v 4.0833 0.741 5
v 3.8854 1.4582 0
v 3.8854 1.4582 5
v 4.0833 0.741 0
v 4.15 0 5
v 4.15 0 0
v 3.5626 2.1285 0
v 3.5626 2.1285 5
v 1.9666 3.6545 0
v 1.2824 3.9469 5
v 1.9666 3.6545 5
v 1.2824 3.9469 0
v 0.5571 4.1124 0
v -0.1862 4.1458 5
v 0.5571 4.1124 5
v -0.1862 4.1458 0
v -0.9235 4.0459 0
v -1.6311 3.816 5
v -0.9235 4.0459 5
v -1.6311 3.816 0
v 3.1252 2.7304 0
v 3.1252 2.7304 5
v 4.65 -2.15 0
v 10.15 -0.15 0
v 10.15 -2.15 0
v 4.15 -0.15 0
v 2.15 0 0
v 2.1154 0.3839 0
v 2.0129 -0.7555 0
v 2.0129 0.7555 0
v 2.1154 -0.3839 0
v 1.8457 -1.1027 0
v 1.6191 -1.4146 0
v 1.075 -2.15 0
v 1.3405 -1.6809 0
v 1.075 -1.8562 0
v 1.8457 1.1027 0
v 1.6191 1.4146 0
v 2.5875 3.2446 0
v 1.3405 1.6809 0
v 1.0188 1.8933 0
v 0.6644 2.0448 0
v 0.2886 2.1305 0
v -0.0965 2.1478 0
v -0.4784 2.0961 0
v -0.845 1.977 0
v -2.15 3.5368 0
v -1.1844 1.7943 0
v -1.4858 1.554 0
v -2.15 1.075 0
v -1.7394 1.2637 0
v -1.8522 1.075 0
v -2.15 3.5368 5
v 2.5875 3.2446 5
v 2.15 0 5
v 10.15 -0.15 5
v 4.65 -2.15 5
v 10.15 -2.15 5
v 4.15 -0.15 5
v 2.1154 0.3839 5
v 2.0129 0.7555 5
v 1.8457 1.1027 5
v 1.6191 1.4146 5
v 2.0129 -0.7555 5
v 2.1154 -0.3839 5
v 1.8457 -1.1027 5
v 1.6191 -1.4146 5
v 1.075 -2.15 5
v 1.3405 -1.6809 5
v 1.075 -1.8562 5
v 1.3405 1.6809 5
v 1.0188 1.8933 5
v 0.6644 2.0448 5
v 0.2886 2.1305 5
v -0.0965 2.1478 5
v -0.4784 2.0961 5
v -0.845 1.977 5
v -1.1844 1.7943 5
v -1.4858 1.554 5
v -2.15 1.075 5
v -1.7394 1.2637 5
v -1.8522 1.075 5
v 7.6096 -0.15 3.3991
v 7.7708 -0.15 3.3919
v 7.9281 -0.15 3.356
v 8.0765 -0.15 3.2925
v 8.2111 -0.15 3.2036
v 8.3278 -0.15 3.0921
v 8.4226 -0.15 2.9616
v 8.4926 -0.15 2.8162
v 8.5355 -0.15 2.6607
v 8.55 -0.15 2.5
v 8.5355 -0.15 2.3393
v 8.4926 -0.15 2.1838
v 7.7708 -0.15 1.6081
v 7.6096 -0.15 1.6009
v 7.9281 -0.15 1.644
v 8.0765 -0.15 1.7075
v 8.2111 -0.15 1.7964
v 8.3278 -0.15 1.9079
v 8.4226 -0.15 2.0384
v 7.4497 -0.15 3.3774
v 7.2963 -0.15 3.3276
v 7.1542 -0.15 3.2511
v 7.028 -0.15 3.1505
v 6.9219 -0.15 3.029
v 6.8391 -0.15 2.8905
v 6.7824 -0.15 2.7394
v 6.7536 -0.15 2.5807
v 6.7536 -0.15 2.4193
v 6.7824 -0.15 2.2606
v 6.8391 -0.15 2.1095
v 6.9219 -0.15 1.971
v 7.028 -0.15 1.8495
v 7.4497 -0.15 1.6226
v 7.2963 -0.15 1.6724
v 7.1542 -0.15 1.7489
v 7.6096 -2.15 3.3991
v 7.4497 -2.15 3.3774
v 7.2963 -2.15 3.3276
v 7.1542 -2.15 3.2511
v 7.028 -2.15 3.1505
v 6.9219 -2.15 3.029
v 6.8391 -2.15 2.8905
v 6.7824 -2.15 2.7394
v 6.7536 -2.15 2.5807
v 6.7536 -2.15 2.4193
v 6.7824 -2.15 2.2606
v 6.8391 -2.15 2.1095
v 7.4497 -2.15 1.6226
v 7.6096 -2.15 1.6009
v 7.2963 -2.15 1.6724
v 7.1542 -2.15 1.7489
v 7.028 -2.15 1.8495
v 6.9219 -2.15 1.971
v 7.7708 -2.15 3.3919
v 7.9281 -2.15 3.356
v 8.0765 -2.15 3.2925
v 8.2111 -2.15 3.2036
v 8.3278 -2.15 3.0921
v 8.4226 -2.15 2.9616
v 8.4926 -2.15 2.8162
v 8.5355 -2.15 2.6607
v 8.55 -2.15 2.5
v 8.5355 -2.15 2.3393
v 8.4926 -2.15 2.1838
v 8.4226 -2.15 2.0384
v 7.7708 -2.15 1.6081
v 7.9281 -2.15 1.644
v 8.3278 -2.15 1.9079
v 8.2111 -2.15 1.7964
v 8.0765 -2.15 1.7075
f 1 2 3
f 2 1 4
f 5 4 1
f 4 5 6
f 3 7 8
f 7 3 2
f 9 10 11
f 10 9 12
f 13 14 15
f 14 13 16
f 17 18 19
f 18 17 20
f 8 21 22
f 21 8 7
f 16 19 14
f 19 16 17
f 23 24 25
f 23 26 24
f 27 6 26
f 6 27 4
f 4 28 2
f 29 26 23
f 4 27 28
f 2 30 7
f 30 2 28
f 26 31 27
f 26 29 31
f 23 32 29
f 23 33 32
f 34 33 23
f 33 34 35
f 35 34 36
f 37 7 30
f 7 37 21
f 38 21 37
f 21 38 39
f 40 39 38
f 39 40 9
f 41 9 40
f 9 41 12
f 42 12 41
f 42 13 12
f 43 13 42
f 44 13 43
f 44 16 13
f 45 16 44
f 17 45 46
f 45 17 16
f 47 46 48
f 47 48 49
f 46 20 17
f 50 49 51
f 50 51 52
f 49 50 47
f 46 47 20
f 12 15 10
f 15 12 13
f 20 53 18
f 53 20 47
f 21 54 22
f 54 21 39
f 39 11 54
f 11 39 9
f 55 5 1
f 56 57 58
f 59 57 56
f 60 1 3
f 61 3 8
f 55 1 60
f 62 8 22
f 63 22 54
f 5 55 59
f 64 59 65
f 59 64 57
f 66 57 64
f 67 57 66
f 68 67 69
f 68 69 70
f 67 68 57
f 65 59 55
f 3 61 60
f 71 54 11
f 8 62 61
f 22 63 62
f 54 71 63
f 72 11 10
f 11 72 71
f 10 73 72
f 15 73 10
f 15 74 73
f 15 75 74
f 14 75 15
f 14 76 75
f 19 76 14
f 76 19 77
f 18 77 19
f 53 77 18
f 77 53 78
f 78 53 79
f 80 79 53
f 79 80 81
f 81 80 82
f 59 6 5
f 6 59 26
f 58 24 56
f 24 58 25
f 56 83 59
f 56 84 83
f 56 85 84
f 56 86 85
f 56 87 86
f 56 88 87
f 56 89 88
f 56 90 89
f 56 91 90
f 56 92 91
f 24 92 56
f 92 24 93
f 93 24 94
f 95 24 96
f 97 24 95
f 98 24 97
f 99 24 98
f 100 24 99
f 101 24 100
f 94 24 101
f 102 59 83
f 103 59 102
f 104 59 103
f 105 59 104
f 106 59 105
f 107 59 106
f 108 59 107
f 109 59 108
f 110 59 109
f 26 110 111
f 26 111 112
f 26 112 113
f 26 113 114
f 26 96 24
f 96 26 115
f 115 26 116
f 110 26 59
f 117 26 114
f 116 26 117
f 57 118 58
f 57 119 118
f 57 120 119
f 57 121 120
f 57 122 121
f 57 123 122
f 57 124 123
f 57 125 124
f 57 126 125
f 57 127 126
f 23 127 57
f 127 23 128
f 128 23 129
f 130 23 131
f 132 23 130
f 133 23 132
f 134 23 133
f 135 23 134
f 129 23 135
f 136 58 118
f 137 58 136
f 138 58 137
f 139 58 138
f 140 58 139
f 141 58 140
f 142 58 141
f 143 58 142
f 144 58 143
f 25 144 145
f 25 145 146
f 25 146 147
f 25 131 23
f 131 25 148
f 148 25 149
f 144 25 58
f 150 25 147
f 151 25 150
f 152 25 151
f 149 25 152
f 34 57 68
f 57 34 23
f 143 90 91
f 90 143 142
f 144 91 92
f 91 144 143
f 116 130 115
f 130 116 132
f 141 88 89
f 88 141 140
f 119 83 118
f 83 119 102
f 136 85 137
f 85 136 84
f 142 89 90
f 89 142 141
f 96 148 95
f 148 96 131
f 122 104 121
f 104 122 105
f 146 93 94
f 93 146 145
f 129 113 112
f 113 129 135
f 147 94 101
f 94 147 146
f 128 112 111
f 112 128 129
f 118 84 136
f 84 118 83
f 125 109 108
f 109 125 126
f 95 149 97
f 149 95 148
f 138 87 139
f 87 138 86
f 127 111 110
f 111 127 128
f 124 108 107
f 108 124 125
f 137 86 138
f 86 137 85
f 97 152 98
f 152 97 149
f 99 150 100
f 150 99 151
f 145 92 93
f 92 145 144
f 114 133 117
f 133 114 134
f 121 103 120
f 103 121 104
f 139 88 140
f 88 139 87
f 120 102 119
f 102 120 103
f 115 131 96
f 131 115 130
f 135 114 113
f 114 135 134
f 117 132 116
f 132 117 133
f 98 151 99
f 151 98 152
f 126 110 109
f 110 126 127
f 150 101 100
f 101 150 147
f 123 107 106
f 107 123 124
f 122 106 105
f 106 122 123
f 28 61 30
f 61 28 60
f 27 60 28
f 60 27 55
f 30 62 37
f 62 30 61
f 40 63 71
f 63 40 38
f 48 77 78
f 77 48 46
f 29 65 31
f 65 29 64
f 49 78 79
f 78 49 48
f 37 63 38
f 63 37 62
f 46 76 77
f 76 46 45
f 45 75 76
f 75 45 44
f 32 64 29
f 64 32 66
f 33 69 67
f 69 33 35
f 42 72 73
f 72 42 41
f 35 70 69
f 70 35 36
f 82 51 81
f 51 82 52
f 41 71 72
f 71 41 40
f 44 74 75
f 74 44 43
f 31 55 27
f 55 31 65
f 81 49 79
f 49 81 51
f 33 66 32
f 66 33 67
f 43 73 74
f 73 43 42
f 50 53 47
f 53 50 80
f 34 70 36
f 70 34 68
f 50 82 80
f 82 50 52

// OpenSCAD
/*
 * Corner Cable Clip (Parametric), v0.42
 *
 * by Alex Franke (CodeCreations), Dec 2012
 * http://www.theFrankes.com
 * 
 * Licenced under Creative Commons Attribution - Non-Commercial - Share Alike 3.0 
 * 
 * DESCRIPTION: Holds a cable into a corner with a single nail.  
 * 
 * INSTRUCTIONS: Change "User-defined values" to suit your needs and print. Attach with a single nail. 
 * 
 * v0.69, Dec 30, 2012: Fixed a bug that caused the nail hole to be placed too close the body 
 *   on short tabs. 
 * v0.42, Dec 30, 2012: Initial Release.
 * 
 * TODO: 
 *   * None at this time. 
 */


/////////////////////////////////////////////////////////////////////////////
// User-defined values... 
/////////////////////////////////////////////////////////////////////////////

cableDiameter  = 4.3; // The diameter of the cable to be clipped 
nailDiameter   = 1.8; // The diameter of the nail or screw used to fasten the clip down

width          = 5;   // The overall width of the cable clip
tabLength      = 6;   // The length of the tab the nail goes through

thickness      = 2;   // The thickness of the clip 

$fn            = 35;  // General curve quality


/////////////////////////////////////////////////////////////////////////////
// The code...
/////////////////////////////////////////////////////////////////////////////

radius = cableDiameter/2+thickness; 
cutcube = [radius*2+1,radius*2+1,width+1]; // used for trimming the piece down to size 

difference() {
	union() {
		cylinder(h=width,r=radius);

		// close circle
		translate([0,-radius,0]) 
			cube([radius, radius, width]);

		// tab
		translate([radius,-radius+thickness,0]) 
			cube([tabLength, thickness, width]);
	}

	// Nail hole 
	translate([radius+tabLength-min(width/2,tabLength/2),0,width/2]) 
		rotate([90,0,0]) 
			cylinder(h=radius*2+1,r=nailDiameter/2, center=true);

	// Cable hole 
	translate([0,0,width/2]) 
		cylinder(h=width+1,r=cableDiameter/2,center=true);

	// Cut out the rest 
	translate([-cutcube[0]/2,-cutcube[1]-cableDiameter/2,-0.5]) 
		cube(cutcube);
	translate([-cutcube[0]-cableDiameter/2,-cutcube[1]/2,-0.5]) 
		cube(cutcube);
	translate([-cutcube[0]+cableDiameter/4,-cutcube[1]+cableDiameter/4,-0.5]) 
		cube(cutcube);
}
